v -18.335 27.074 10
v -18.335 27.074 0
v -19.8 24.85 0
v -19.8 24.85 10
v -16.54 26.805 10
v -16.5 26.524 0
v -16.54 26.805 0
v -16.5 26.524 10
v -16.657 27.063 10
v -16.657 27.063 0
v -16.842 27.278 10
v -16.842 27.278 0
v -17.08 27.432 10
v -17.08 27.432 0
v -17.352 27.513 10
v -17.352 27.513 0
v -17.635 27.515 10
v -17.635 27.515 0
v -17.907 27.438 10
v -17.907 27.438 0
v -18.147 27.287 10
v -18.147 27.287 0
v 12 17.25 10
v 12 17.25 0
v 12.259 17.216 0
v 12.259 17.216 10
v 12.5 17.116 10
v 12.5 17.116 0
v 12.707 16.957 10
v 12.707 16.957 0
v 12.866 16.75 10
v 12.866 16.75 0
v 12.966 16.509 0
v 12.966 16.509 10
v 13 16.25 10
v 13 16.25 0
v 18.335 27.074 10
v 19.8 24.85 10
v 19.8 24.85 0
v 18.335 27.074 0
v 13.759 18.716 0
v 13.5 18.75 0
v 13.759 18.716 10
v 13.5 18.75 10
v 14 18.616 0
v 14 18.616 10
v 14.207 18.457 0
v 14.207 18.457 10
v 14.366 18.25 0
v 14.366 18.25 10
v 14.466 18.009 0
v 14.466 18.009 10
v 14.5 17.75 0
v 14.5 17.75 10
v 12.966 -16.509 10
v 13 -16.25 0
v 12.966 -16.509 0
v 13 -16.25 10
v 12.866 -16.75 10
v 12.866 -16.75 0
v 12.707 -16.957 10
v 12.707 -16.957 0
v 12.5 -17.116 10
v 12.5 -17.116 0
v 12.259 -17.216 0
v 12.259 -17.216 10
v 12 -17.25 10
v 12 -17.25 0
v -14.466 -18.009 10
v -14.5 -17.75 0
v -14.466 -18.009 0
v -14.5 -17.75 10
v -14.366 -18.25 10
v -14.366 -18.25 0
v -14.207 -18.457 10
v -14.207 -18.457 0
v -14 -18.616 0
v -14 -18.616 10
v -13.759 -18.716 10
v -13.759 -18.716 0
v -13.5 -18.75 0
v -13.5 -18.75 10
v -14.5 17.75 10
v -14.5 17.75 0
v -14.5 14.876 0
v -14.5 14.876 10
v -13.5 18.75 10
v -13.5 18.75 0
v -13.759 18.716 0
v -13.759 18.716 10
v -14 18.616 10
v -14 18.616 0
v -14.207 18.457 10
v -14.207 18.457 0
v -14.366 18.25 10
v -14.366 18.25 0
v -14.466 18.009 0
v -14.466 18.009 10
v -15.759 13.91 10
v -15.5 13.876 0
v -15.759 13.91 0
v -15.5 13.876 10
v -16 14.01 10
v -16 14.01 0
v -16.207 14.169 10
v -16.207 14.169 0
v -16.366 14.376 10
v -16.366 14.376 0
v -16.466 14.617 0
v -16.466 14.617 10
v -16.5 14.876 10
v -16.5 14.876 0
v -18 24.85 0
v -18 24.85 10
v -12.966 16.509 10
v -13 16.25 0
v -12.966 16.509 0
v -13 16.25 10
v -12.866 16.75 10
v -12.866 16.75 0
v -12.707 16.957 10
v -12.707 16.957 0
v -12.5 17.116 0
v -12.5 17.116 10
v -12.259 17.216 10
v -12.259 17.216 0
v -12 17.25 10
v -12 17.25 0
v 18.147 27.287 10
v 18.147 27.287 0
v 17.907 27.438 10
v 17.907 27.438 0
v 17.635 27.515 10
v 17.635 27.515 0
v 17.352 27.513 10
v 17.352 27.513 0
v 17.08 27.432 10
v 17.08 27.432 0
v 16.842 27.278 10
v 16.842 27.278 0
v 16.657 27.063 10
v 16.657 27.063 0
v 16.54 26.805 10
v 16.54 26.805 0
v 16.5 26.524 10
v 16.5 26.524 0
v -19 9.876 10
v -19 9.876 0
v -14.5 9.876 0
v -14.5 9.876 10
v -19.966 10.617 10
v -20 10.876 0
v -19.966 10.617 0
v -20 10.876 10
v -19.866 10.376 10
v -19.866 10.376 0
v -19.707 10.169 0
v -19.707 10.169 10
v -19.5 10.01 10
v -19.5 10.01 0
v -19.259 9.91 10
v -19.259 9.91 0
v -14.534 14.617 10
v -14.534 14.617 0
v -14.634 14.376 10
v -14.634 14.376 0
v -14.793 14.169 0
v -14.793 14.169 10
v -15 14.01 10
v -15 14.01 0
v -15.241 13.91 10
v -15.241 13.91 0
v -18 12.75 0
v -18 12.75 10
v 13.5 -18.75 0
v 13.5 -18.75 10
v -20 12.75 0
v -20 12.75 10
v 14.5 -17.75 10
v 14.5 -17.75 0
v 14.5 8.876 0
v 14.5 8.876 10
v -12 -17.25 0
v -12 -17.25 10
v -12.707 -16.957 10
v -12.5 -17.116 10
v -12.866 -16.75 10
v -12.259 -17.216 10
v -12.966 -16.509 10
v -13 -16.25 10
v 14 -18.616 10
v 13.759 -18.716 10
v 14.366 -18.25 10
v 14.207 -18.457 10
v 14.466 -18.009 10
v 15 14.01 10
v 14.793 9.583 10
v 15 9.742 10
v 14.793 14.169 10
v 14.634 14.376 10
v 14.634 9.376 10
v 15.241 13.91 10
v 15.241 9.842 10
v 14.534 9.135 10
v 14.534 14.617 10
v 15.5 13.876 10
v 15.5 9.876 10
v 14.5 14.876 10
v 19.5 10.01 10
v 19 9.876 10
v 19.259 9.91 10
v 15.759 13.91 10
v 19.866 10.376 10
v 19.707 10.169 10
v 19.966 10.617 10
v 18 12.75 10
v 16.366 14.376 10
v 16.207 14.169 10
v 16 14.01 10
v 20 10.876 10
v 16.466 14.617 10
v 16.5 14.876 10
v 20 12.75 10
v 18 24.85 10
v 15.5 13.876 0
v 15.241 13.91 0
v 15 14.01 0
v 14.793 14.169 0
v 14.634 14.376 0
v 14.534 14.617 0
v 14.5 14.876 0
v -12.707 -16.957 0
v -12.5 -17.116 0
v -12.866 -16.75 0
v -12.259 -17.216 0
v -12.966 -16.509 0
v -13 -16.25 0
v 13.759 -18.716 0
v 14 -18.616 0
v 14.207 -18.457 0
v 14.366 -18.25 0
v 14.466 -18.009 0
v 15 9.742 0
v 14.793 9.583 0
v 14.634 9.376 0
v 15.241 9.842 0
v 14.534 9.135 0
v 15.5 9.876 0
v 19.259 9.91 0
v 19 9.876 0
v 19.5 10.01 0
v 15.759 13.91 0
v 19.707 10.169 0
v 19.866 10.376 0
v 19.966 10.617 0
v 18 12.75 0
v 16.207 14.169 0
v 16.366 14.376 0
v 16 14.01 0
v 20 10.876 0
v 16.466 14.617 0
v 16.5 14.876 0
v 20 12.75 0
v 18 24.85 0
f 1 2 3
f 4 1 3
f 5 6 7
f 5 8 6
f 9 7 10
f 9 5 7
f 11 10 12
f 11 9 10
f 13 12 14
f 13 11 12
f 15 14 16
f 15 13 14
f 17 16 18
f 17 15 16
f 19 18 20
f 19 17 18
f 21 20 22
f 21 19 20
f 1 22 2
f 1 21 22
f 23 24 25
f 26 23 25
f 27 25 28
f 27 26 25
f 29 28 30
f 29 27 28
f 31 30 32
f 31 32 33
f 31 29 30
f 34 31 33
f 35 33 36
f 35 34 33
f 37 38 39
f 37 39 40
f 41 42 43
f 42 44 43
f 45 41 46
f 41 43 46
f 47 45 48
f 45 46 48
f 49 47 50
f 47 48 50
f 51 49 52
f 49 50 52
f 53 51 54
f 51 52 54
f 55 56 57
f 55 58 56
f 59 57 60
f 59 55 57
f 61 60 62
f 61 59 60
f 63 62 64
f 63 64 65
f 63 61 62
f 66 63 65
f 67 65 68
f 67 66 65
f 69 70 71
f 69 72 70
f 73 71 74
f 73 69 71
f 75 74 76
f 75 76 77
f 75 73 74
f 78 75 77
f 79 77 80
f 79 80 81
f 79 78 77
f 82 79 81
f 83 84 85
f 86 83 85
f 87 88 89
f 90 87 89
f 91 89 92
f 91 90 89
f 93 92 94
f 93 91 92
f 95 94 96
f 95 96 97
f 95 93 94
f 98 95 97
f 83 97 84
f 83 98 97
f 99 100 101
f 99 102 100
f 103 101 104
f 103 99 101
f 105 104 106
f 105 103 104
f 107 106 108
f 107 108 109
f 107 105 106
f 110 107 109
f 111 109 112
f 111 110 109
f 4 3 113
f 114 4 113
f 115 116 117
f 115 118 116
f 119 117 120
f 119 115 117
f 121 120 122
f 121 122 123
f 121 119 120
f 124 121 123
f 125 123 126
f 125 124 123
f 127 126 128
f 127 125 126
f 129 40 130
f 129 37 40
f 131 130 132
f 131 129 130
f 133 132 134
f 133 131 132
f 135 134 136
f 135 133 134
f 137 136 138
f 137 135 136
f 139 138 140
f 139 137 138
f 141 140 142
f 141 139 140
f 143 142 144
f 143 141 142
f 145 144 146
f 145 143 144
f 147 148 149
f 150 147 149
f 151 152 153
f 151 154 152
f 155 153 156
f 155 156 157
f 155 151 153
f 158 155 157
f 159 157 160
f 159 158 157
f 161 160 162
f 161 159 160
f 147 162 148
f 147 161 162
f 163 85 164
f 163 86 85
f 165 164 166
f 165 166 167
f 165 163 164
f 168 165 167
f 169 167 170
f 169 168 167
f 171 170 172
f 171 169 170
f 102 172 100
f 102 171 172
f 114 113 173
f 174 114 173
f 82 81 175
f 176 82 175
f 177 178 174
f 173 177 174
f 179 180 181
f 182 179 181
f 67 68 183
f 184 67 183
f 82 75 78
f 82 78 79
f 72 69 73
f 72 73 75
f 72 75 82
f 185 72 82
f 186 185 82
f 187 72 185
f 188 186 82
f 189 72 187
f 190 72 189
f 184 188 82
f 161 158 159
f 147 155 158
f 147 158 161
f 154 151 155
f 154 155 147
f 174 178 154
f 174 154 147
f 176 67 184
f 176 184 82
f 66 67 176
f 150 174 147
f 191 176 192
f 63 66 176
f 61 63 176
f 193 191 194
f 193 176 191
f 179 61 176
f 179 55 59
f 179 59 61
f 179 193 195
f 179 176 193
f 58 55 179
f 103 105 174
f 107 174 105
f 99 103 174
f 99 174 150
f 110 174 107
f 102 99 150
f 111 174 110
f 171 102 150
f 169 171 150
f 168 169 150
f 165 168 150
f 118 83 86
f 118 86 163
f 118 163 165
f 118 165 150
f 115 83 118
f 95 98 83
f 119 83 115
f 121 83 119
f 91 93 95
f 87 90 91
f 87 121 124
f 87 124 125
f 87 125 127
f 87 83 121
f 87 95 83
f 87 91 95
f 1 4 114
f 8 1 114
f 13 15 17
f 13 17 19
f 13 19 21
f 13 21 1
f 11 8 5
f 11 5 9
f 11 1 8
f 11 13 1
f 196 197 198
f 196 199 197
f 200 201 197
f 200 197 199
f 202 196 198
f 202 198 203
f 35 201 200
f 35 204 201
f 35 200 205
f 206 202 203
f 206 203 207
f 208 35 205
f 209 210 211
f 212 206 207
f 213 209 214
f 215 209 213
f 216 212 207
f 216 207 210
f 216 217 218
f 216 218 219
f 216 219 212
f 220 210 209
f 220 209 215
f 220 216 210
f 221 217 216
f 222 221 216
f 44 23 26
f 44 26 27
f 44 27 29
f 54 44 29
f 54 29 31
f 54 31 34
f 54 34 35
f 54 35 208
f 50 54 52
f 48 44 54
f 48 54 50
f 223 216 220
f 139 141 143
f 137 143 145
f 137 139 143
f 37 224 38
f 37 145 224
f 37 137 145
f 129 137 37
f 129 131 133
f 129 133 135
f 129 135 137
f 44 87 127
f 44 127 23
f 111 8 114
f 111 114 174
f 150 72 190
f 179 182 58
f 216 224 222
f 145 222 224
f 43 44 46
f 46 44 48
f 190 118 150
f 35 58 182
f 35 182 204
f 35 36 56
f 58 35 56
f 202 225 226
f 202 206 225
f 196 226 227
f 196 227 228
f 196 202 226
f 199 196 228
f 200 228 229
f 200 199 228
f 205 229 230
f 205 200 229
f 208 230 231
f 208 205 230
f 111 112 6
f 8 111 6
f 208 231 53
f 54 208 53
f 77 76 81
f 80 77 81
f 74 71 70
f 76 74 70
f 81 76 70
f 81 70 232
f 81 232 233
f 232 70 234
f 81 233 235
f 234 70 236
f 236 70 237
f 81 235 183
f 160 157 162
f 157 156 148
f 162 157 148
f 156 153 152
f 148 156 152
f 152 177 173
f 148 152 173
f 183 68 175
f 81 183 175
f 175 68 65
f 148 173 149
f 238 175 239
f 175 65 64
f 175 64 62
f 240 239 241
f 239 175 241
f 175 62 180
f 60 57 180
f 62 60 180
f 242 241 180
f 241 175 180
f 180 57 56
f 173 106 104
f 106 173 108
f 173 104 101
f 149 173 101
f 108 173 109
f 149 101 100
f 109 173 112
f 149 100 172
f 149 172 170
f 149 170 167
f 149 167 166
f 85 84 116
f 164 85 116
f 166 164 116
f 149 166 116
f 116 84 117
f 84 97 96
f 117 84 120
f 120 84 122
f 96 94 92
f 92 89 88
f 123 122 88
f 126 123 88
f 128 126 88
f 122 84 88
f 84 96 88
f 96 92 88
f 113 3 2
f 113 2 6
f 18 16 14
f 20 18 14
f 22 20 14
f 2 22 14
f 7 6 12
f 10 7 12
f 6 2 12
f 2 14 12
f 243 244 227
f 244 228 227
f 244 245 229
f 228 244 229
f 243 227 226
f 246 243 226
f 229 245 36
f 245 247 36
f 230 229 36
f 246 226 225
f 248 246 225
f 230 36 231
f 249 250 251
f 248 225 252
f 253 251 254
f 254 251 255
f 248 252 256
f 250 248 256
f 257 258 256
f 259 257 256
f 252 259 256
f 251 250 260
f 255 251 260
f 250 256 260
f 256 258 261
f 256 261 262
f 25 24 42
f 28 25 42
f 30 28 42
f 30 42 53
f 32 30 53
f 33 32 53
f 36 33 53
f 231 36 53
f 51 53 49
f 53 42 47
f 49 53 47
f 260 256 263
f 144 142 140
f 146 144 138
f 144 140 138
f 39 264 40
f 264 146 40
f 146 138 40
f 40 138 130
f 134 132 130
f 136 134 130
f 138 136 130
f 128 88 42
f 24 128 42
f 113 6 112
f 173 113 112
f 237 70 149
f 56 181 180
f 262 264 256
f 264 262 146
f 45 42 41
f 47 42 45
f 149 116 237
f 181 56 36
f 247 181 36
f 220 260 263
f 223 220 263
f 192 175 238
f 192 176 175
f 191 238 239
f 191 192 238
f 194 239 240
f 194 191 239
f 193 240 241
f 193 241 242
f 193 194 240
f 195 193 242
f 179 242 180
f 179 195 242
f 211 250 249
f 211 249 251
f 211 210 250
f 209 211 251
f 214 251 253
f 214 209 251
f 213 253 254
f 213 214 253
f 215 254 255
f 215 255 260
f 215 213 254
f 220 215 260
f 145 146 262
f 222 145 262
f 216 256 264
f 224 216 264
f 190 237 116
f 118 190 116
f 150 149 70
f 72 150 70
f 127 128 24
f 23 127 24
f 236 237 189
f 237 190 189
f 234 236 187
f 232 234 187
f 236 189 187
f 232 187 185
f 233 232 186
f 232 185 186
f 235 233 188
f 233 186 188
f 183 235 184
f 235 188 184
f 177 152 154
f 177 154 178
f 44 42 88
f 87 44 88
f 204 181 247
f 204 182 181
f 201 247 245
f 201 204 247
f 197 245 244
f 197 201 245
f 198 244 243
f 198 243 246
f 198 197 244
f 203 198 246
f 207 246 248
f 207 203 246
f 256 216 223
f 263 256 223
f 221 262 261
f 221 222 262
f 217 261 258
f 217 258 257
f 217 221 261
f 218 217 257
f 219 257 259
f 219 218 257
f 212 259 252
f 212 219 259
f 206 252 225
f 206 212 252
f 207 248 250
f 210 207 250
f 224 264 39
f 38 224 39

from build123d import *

# Parameters (mm, degrees)
F0_W     = 2
F0_H     = 4
F0_H_2   = 2.8740456328
F1_DEPTH = 10
F2_R     = 0.99999


# Not quite as in the source:
# - a fillet or chamfer is up to 0.001 mm smaller than in the source, because OpenCascade refuses the exact size


with BuildPart() as f1:
    # F0 (on Top) → F1 (new body)
    with BuildSketch(Plane.XY):
        Polygon((14.5, 18.75), (-14.5, 18.75), (-14.5, 13.8759543672), (-14.5, 9.8759543672), (-14.5, -18.75), (14.5, -18.75), (14.5, 9.8759543672), (14.5, 13.8759543672), align=None)
        Polygon((-13, 4.7144976147), (-13, 17.25), (13, 17.25), (13, 4.7144976147), (13, -2.2855023853), (13, -17.25), (-13, -17.25), (-13, -2.2855023853), align=None, mode=Mode.SUBTRACT)
        with Locations((-15.5, 11.8759543672)):
            Rectangle(F0_W, F0_H)
        Polygon((-16.5, 9.8759543672), (-16.5, 13.8759543672), (-16.5, 29.8609879265), (-19.8, 24.85), (-18, 24.85), (-18, 12.75), (-18, 9.8759543672), align=None)
        with Locations((15.5, 11.8759543672)):
            Rectangle(F0_W, F0_H)
        Polygon((16.5, 29.8609879265), (16.5, 13.8759543672), (16.5, 9.8759543672), (18, 9.8759543672), (18, 12.75), (18, 24.85), (19.8, 24.85), align=None)
        with Locations((-19, 11.3129771836)):
            Rectangle(F0_W, F0_H_2)
        with Locations((19, 11.3129771836)):
            Rectangle(F0_W, F0_H_2)
    extrude(amount=F1_DEPTH)

    # F2 (radius 1 in the source; OpenCascade refuses exactly that, so slightly less here)
    f2_edges = [f1.edges().sort_by_distance(p)[0] for p in [
        (-14.5, 18.75, 5),
        (-20, 9.875954, 5),
        (14.5, 18.75, 5),
        (20, 9.875954, 5),
        (-13, 17.25, 5),
        (14.5, 9.875954, 5),
        (14.5, -18.75, 5),
        (-14.5, -18.75, 5),
        (-13, -17.25, 5),
        (13, 17.25, 5),
        (13, -17.25, 5),
        (-14.5, 13.875954, 5),
        (16.5, 13.875954, 5),
        (-16.5, 13.875954, 5),
        (14.5, 13.875954, 5),
        (-16.5, 29.860988, 5),
        (16.5, 29.860988, 5),
    ]]
    fillet(f2_edges, radius=F2_R)


solid = f1.part
